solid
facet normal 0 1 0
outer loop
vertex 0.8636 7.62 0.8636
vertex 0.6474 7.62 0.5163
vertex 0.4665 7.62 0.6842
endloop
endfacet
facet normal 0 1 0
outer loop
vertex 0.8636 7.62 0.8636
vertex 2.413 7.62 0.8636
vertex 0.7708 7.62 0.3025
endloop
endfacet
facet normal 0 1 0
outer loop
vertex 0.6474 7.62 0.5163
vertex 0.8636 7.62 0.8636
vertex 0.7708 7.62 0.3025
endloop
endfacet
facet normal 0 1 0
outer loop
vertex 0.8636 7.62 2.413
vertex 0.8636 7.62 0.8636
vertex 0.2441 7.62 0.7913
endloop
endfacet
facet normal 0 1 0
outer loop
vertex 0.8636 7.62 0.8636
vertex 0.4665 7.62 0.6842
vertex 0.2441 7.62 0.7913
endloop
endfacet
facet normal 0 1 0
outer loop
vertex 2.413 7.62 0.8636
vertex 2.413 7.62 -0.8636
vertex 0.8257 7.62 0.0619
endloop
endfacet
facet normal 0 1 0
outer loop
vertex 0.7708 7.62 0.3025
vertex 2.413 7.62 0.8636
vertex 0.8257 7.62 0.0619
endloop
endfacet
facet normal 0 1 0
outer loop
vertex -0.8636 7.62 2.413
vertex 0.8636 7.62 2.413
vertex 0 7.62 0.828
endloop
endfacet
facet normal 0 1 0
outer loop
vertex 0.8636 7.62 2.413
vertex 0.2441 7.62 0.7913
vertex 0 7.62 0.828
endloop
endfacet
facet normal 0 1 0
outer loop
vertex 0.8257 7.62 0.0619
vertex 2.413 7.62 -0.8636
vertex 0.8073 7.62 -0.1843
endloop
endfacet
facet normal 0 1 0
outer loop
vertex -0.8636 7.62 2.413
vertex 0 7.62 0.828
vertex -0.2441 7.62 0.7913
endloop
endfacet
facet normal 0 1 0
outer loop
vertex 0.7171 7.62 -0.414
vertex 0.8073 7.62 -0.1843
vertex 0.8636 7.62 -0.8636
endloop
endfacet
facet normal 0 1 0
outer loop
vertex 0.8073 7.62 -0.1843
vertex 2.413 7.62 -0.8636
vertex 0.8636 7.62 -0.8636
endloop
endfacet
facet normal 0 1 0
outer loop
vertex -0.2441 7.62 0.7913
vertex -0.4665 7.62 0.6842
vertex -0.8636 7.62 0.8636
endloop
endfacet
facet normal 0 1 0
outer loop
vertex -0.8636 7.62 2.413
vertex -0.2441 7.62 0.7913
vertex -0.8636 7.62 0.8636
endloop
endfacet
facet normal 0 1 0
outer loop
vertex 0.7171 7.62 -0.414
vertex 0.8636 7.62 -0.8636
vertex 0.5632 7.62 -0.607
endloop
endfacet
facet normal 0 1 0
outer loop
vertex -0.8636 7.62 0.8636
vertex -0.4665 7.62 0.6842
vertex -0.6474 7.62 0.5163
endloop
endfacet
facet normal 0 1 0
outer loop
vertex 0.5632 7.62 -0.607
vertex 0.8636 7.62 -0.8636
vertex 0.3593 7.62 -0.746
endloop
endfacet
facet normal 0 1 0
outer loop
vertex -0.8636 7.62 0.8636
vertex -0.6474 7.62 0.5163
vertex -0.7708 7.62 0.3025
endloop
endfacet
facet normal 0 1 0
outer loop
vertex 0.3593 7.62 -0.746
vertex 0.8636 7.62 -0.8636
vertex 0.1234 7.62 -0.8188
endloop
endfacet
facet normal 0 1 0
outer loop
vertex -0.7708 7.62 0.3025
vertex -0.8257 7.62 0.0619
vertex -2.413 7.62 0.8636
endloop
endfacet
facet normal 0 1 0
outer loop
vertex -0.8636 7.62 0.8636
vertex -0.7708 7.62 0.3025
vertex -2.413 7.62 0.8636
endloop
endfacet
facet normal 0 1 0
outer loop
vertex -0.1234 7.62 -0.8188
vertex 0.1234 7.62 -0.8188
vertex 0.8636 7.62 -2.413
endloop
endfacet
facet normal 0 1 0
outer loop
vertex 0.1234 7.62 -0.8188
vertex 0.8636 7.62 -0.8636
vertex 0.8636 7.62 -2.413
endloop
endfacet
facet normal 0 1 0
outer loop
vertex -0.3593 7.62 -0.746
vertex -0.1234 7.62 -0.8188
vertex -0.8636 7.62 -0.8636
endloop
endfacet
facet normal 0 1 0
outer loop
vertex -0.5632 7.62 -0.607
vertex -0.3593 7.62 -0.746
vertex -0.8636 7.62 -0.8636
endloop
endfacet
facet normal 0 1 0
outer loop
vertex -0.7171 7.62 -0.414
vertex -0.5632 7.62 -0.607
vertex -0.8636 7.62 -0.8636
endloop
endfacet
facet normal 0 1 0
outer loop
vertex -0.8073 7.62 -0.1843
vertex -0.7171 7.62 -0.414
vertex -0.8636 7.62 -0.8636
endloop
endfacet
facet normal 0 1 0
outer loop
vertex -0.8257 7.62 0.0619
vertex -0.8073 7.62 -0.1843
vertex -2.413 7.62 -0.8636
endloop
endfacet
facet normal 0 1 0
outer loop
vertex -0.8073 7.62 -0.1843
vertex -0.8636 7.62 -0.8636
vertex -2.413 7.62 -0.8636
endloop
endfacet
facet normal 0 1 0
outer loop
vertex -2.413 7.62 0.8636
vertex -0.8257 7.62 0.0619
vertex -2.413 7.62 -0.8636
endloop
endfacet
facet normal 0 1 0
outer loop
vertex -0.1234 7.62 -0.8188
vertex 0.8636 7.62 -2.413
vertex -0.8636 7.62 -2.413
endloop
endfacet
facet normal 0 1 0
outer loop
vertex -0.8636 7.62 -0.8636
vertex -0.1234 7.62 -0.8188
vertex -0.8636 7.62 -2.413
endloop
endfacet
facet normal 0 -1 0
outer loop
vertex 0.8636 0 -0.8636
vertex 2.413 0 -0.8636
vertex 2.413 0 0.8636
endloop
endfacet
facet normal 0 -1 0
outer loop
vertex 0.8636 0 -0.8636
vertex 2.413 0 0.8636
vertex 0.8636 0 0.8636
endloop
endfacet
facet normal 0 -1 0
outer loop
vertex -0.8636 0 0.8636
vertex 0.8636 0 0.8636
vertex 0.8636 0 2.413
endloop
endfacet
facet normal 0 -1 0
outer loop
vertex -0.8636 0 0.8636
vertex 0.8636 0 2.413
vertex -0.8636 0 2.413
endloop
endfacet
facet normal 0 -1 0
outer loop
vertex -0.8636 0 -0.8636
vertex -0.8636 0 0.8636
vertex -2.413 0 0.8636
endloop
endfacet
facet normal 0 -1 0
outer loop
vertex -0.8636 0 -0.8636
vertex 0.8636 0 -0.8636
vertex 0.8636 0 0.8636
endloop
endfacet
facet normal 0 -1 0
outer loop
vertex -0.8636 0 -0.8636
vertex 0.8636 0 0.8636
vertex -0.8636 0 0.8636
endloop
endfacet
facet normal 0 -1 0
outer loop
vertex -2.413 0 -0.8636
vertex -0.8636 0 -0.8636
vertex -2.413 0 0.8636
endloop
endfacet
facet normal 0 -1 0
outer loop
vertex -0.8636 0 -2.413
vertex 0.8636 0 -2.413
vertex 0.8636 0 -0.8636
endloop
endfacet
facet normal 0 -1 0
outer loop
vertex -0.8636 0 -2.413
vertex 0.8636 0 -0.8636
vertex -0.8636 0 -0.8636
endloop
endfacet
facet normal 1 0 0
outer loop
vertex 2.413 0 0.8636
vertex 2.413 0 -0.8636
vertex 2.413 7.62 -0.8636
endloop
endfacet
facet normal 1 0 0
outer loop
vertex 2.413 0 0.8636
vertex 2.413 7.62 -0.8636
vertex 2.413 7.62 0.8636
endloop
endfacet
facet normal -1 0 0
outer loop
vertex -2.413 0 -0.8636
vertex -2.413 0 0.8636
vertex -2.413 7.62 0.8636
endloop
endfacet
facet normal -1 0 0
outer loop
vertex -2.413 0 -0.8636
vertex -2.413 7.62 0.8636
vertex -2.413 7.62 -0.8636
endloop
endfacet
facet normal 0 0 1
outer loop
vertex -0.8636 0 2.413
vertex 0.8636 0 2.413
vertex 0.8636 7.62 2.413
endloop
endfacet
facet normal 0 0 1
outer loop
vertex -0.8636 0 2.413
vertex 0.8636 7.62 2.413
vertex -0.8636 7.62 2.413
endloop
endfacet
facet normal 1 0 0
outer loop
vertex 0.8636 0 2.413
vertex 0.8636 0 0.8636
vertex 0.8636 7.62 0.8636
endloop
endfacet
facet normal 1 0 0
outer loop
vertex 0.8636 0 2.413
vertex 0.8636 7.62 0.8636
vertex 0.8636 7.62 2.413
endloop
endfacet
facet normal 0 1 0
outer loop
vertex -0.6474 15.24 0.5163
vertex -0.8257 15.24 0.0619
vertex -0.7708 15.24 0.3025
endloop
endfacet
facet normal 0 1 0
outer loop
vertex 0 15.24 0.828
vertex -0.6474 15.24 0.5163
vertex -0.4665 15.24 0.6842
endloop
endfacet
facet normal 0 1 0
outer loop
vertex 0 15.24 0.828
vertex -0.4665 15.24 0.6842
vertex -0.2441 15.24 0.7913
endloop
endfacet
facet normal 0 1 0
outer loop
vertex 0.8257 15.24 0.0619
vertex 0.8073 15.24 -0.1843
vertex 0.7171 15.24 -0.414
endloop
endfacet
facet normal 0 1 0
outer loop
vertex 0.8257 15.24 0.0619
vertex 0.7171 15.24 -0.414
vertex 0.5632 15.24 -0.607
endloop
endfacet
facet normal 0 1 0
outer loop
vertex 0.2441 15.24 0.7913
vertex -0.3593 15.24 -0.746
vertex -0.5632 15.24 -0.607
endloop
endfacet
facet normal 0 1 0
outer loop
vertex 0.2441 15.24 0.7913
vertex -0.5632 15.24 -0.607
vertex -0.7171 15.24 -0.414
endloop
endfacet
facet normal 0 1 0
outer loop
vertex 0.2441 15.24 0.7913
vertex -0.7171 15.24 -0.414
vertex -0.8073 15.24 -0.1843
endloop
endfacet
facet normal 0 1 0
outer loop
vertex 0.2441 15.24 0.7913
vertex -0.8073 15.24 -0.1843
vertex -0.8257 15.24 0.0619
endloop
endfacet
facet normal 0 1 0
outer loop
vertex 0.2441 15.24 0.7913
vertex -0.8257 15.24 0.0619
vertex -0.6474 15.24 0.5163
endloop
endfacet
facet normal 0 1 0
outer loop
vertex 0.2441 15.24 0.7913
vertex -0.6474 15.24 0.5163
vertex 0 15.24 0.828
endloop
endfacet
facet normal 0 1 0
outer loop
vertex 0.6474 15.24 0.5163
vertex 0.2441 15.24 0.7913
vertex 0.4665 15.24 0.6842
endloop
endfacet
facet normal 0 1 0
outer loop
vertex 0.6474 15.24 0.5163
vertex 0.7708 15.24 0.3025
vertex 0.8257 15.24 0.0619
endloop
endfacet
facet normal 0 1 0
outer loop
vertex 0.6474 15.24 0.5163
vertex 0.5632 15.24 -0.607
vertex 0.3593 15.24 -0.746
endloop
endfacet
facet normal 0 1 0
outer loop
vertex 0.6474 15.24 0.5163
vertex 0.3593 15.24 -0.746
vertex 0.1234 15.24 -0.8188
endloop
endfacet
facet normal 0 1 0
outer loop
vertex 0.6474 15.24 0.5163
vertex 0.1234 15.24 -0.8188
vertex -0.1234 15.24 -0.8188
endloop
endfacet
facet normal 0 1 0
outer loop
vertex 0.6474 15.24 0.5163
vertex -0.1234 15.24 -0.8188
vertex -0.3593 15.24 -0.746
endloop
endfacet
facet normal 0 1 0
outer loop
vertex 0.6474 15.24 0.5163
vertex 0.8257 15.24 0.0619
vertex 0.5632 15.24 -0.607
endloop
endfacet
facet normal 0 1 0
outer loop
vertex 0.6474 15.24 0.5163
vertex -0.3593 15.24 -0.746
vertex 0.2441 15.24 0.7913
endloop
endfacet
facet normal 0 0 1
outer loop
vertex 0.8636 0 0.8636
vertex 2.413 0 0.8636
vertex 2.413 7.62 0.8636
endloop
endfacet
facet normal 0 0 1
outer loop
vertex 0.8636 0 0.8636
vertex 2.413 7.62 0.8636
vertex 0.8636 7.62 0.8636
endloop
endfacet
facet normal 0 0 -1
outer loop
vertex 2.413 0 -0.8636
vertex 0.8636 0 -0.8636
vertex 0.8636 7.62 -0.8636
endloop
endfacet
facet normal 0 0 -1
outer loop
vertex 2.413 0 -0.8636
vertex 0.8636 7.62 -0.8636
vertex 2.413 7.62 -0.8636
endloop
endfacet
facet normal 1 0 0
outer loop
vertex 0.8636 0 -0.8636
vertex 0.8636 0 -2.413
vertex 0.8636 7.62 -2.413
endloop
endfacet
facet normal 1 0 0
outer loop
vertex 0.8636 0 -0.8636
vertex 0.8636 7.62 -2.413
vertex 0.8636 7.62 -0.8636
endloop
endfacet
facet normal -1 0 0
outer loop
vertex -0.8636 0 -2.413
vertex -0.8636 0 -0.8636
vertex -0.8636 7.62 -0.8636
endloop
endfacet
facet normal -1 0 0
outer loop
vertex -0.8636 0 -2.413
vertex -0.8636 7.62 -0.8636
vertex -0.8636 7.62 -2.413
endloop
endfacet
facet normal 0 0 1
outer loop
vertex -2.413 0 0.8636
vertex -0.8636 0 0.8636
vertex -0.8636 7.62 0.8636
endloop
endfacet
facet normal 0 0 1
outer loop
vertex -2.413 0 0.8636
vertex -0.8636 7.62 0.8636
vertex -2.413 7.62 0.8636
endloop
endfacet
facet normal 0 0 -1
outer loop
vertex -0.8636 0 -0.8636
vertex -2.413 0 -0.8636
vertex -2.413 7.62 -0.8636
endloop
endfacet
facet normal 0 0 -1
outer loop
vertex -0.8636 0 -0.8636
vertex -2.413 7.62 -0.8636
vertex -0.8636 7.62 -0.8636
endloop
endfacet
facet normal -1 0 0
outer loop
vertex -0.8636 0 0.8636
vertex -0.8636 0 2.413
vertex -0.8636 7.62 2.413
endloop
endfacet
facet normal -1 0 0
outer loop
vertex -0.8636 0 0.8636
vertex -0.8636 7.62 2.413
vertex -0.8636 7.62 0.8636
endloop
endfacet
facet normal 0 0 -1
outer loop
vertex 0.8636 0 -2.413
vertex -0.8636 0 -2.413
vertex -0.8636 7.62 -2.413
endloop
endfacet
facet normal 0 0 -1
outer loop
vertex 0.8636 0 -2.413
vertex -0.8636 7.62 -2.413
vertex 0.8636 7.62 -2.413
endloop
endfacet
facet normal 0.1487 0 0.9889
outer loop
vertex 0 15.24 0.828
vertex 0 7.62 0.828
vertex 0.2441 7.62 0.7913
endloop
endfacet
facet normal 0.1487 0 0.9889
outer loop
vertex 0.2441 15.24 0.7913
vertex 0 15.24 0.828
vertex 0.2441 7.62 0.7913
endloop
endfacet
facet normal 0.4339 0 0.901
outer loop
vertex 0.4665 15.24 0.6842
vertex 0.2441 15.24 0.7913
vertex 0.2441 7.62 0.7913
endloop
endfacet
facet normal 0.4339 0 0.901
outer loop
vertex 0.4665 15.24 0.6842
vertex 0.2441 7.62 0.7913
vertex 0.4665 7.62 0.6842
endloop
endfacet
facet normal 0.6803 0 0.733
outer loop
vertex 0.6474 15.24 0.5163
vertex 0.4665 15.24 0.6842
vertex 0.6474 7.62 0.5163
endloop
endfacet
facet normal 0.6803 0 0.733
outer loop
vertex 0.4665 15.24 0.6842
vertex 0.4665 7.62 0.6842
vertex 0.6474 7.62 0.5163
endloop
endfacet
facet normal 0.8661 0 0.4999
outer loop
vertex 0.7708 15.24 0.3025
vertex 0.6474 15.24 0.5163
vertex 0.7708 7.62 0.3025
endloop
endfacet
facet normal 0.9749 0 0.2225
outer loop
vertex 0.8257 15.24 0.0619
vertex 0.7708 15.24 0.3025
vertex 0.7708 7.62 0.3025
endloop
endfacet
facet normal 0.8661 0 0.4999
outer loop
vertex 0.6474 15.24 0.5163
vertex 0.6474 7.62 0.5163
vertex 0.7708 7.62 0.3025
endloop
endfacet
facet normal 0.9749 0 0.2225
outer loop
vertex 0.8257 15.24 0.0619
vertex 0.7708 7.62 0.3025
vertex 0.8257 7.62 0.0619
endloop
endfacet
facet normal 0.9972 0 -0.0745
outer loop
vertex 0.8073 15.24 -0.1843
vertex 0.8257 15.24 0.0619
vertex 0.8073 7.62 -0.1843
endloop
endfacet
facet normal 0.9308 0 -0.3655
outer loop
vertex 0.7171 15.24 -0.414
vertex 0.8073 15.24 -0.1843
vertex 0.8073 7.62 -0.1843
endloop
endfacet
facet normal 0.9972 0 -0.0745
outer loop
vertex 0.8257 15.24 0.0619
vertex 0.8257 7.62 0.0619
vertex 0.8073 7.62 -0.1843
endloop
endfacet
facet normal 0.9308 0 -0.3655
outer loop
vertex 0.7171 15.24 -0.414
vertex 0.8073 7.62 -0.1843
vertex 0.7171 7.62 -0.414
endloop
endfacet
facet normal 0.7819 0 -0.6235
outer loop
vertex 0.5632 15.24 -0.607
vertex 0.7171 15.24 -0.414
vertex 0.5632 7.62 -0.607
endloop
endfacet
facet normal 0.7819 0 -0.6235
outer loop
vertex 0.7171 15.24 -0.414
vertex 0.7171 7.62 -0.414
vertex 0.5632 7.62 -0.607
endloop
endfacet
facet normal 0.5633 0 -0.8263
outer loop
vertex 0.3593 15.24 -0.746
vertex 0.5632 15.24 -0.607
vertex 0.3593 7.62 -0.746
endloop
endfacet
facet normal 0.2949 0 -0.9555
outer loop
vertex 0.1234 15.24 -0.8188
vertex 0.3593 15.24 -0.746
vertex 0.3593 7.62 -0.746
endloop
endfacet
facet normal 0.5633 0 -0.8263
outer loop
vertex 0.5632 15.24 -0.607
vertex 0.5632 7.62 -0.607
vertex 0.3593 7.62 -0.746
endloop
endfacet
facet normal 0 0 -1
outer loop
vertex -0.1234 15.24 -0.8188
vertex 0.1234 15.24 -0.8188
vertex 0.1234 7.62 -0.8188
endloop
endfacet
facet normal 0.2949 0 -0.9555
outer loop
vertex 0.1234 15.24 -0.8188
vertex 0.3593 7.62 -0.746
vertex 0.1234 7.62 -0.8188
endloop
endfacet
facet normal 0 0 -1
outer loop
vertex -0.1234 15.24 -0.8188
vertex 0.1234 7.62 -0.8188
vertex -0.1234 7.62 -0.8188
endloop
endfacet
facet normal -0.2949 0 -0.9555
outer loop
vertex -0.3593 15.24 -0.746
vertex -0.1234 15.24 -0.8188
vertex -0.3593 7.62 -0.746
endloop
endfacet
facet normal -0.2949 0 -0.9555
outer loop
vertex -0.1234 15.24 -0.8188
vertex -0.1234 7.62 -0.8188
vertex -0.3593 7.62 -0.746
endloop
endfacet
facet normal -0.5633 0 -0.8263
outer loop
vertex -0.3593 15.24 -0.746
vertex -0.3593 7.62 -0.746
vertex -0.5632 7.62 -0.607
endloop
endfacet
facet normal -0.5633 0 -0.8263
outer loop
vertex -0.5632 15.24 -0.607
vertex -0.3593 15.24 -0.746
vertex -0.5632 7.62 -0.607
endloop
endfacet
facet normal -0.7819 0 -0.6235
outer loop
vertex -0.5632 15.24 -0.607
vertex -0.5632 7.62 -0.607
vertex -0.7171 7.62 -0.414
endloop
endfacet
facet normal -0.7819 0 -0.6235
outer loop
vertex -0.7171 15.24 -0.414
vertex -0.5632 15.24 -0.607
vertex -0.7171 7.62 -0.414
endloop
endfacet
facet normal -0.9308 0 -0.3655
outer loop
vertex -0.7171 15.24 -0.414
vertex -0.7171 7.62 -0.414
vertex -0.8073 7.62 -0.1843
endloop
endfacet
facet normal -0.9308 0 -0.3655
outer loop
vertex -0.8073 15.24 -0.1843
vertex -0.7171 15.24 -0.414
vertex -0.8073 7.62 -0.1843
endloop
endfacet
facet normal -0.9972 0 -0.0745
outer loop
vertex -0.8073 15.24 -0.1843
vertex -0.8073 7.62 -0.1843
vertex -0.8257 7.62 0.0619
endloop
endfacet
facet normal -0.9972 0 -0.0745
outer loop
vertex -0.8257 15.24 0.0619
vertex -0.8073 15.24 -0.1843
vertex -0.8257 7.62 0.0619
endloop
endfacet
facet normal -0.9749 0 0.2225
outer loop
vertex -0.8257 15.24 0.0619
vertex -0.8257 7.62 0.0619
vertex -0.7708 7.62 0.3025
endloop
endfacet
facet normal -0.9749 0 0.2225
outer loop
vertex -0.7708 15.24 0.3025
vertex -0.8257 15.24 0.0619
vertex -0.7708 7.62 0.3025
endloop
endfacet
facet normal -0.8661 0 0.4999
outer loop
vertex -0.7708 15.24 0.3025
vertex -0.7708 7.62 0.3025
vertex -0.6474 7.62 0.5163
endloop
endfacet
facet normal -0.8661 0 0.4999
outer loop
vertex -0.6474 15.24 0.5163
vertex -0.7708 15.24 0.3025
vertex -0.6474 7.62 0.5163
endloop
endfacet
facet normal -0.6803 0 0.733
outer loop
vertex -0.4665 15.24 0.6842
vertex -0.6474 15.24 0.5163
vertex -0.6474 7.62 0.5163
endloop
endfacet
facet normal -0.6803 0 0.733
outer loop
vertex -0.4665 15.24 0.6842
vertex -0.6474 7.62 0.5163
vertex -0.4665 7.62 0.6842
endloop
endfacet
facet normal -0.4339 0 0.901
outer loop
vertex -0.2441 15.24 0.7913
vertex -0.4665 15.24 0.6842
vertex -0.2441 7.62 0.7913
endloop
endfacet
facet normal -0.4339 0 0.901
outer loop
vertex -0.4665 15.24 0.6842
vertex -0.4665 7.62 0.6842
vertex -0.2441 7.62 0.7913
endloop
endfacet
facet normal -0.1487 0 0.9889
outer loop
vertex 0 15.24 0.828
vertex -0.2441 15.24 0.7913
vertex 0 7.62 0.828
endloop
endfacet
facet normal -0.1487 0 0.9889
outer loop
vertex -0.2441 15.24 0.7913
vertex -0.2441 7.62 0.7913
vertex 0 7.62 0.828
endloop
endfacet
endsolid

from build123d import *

# Parameters (mm, degrees)
BOSS_EXTRUDE1_DEPTH = 7.62
SKETCH2_R           = 0.82804
BOSS_EXTRUDE2_DEPTH = 7.62


with BuildPart() as part:
    # Sketch1 → Boss-Extrude1 (new body)
    with BuildSketch(Plane(origin=(0, 0, 0), x_dir=(1, 0, 0), z_dir=(0, 1, 0))):
        Polygon((0.8636, 0.8636), (2.413, 0.8636), (2.413, -0.8636), (0.8636, -0.8636), (0.8636, -2.413), (-0.8636, -2.413), (-0.8636, -0.8636), (-2.413, -0.8636), (-2.413, 0.8636), (-0.8636, 0.8636), (-0.8636, 2.413), (0.8636, 2.413), align=None)
    extrude(amount=BOSS_EXTRUDE1_DEPTH)

    # Sketch2 → Boss-Extrude2 (add)
    with BuildSketch(Plane(origin=(0, 7.62, 0), x_dir=(1, 0, 0), z_dir=(0, 1, 0))):
        with Locations(Location((0, 0, 0), (0, 0, 270))):
            Circle(SKETCH2_R)
    extrude(amount=BOSS_EXTRUDE2_DEPTH)


solid = part.part
